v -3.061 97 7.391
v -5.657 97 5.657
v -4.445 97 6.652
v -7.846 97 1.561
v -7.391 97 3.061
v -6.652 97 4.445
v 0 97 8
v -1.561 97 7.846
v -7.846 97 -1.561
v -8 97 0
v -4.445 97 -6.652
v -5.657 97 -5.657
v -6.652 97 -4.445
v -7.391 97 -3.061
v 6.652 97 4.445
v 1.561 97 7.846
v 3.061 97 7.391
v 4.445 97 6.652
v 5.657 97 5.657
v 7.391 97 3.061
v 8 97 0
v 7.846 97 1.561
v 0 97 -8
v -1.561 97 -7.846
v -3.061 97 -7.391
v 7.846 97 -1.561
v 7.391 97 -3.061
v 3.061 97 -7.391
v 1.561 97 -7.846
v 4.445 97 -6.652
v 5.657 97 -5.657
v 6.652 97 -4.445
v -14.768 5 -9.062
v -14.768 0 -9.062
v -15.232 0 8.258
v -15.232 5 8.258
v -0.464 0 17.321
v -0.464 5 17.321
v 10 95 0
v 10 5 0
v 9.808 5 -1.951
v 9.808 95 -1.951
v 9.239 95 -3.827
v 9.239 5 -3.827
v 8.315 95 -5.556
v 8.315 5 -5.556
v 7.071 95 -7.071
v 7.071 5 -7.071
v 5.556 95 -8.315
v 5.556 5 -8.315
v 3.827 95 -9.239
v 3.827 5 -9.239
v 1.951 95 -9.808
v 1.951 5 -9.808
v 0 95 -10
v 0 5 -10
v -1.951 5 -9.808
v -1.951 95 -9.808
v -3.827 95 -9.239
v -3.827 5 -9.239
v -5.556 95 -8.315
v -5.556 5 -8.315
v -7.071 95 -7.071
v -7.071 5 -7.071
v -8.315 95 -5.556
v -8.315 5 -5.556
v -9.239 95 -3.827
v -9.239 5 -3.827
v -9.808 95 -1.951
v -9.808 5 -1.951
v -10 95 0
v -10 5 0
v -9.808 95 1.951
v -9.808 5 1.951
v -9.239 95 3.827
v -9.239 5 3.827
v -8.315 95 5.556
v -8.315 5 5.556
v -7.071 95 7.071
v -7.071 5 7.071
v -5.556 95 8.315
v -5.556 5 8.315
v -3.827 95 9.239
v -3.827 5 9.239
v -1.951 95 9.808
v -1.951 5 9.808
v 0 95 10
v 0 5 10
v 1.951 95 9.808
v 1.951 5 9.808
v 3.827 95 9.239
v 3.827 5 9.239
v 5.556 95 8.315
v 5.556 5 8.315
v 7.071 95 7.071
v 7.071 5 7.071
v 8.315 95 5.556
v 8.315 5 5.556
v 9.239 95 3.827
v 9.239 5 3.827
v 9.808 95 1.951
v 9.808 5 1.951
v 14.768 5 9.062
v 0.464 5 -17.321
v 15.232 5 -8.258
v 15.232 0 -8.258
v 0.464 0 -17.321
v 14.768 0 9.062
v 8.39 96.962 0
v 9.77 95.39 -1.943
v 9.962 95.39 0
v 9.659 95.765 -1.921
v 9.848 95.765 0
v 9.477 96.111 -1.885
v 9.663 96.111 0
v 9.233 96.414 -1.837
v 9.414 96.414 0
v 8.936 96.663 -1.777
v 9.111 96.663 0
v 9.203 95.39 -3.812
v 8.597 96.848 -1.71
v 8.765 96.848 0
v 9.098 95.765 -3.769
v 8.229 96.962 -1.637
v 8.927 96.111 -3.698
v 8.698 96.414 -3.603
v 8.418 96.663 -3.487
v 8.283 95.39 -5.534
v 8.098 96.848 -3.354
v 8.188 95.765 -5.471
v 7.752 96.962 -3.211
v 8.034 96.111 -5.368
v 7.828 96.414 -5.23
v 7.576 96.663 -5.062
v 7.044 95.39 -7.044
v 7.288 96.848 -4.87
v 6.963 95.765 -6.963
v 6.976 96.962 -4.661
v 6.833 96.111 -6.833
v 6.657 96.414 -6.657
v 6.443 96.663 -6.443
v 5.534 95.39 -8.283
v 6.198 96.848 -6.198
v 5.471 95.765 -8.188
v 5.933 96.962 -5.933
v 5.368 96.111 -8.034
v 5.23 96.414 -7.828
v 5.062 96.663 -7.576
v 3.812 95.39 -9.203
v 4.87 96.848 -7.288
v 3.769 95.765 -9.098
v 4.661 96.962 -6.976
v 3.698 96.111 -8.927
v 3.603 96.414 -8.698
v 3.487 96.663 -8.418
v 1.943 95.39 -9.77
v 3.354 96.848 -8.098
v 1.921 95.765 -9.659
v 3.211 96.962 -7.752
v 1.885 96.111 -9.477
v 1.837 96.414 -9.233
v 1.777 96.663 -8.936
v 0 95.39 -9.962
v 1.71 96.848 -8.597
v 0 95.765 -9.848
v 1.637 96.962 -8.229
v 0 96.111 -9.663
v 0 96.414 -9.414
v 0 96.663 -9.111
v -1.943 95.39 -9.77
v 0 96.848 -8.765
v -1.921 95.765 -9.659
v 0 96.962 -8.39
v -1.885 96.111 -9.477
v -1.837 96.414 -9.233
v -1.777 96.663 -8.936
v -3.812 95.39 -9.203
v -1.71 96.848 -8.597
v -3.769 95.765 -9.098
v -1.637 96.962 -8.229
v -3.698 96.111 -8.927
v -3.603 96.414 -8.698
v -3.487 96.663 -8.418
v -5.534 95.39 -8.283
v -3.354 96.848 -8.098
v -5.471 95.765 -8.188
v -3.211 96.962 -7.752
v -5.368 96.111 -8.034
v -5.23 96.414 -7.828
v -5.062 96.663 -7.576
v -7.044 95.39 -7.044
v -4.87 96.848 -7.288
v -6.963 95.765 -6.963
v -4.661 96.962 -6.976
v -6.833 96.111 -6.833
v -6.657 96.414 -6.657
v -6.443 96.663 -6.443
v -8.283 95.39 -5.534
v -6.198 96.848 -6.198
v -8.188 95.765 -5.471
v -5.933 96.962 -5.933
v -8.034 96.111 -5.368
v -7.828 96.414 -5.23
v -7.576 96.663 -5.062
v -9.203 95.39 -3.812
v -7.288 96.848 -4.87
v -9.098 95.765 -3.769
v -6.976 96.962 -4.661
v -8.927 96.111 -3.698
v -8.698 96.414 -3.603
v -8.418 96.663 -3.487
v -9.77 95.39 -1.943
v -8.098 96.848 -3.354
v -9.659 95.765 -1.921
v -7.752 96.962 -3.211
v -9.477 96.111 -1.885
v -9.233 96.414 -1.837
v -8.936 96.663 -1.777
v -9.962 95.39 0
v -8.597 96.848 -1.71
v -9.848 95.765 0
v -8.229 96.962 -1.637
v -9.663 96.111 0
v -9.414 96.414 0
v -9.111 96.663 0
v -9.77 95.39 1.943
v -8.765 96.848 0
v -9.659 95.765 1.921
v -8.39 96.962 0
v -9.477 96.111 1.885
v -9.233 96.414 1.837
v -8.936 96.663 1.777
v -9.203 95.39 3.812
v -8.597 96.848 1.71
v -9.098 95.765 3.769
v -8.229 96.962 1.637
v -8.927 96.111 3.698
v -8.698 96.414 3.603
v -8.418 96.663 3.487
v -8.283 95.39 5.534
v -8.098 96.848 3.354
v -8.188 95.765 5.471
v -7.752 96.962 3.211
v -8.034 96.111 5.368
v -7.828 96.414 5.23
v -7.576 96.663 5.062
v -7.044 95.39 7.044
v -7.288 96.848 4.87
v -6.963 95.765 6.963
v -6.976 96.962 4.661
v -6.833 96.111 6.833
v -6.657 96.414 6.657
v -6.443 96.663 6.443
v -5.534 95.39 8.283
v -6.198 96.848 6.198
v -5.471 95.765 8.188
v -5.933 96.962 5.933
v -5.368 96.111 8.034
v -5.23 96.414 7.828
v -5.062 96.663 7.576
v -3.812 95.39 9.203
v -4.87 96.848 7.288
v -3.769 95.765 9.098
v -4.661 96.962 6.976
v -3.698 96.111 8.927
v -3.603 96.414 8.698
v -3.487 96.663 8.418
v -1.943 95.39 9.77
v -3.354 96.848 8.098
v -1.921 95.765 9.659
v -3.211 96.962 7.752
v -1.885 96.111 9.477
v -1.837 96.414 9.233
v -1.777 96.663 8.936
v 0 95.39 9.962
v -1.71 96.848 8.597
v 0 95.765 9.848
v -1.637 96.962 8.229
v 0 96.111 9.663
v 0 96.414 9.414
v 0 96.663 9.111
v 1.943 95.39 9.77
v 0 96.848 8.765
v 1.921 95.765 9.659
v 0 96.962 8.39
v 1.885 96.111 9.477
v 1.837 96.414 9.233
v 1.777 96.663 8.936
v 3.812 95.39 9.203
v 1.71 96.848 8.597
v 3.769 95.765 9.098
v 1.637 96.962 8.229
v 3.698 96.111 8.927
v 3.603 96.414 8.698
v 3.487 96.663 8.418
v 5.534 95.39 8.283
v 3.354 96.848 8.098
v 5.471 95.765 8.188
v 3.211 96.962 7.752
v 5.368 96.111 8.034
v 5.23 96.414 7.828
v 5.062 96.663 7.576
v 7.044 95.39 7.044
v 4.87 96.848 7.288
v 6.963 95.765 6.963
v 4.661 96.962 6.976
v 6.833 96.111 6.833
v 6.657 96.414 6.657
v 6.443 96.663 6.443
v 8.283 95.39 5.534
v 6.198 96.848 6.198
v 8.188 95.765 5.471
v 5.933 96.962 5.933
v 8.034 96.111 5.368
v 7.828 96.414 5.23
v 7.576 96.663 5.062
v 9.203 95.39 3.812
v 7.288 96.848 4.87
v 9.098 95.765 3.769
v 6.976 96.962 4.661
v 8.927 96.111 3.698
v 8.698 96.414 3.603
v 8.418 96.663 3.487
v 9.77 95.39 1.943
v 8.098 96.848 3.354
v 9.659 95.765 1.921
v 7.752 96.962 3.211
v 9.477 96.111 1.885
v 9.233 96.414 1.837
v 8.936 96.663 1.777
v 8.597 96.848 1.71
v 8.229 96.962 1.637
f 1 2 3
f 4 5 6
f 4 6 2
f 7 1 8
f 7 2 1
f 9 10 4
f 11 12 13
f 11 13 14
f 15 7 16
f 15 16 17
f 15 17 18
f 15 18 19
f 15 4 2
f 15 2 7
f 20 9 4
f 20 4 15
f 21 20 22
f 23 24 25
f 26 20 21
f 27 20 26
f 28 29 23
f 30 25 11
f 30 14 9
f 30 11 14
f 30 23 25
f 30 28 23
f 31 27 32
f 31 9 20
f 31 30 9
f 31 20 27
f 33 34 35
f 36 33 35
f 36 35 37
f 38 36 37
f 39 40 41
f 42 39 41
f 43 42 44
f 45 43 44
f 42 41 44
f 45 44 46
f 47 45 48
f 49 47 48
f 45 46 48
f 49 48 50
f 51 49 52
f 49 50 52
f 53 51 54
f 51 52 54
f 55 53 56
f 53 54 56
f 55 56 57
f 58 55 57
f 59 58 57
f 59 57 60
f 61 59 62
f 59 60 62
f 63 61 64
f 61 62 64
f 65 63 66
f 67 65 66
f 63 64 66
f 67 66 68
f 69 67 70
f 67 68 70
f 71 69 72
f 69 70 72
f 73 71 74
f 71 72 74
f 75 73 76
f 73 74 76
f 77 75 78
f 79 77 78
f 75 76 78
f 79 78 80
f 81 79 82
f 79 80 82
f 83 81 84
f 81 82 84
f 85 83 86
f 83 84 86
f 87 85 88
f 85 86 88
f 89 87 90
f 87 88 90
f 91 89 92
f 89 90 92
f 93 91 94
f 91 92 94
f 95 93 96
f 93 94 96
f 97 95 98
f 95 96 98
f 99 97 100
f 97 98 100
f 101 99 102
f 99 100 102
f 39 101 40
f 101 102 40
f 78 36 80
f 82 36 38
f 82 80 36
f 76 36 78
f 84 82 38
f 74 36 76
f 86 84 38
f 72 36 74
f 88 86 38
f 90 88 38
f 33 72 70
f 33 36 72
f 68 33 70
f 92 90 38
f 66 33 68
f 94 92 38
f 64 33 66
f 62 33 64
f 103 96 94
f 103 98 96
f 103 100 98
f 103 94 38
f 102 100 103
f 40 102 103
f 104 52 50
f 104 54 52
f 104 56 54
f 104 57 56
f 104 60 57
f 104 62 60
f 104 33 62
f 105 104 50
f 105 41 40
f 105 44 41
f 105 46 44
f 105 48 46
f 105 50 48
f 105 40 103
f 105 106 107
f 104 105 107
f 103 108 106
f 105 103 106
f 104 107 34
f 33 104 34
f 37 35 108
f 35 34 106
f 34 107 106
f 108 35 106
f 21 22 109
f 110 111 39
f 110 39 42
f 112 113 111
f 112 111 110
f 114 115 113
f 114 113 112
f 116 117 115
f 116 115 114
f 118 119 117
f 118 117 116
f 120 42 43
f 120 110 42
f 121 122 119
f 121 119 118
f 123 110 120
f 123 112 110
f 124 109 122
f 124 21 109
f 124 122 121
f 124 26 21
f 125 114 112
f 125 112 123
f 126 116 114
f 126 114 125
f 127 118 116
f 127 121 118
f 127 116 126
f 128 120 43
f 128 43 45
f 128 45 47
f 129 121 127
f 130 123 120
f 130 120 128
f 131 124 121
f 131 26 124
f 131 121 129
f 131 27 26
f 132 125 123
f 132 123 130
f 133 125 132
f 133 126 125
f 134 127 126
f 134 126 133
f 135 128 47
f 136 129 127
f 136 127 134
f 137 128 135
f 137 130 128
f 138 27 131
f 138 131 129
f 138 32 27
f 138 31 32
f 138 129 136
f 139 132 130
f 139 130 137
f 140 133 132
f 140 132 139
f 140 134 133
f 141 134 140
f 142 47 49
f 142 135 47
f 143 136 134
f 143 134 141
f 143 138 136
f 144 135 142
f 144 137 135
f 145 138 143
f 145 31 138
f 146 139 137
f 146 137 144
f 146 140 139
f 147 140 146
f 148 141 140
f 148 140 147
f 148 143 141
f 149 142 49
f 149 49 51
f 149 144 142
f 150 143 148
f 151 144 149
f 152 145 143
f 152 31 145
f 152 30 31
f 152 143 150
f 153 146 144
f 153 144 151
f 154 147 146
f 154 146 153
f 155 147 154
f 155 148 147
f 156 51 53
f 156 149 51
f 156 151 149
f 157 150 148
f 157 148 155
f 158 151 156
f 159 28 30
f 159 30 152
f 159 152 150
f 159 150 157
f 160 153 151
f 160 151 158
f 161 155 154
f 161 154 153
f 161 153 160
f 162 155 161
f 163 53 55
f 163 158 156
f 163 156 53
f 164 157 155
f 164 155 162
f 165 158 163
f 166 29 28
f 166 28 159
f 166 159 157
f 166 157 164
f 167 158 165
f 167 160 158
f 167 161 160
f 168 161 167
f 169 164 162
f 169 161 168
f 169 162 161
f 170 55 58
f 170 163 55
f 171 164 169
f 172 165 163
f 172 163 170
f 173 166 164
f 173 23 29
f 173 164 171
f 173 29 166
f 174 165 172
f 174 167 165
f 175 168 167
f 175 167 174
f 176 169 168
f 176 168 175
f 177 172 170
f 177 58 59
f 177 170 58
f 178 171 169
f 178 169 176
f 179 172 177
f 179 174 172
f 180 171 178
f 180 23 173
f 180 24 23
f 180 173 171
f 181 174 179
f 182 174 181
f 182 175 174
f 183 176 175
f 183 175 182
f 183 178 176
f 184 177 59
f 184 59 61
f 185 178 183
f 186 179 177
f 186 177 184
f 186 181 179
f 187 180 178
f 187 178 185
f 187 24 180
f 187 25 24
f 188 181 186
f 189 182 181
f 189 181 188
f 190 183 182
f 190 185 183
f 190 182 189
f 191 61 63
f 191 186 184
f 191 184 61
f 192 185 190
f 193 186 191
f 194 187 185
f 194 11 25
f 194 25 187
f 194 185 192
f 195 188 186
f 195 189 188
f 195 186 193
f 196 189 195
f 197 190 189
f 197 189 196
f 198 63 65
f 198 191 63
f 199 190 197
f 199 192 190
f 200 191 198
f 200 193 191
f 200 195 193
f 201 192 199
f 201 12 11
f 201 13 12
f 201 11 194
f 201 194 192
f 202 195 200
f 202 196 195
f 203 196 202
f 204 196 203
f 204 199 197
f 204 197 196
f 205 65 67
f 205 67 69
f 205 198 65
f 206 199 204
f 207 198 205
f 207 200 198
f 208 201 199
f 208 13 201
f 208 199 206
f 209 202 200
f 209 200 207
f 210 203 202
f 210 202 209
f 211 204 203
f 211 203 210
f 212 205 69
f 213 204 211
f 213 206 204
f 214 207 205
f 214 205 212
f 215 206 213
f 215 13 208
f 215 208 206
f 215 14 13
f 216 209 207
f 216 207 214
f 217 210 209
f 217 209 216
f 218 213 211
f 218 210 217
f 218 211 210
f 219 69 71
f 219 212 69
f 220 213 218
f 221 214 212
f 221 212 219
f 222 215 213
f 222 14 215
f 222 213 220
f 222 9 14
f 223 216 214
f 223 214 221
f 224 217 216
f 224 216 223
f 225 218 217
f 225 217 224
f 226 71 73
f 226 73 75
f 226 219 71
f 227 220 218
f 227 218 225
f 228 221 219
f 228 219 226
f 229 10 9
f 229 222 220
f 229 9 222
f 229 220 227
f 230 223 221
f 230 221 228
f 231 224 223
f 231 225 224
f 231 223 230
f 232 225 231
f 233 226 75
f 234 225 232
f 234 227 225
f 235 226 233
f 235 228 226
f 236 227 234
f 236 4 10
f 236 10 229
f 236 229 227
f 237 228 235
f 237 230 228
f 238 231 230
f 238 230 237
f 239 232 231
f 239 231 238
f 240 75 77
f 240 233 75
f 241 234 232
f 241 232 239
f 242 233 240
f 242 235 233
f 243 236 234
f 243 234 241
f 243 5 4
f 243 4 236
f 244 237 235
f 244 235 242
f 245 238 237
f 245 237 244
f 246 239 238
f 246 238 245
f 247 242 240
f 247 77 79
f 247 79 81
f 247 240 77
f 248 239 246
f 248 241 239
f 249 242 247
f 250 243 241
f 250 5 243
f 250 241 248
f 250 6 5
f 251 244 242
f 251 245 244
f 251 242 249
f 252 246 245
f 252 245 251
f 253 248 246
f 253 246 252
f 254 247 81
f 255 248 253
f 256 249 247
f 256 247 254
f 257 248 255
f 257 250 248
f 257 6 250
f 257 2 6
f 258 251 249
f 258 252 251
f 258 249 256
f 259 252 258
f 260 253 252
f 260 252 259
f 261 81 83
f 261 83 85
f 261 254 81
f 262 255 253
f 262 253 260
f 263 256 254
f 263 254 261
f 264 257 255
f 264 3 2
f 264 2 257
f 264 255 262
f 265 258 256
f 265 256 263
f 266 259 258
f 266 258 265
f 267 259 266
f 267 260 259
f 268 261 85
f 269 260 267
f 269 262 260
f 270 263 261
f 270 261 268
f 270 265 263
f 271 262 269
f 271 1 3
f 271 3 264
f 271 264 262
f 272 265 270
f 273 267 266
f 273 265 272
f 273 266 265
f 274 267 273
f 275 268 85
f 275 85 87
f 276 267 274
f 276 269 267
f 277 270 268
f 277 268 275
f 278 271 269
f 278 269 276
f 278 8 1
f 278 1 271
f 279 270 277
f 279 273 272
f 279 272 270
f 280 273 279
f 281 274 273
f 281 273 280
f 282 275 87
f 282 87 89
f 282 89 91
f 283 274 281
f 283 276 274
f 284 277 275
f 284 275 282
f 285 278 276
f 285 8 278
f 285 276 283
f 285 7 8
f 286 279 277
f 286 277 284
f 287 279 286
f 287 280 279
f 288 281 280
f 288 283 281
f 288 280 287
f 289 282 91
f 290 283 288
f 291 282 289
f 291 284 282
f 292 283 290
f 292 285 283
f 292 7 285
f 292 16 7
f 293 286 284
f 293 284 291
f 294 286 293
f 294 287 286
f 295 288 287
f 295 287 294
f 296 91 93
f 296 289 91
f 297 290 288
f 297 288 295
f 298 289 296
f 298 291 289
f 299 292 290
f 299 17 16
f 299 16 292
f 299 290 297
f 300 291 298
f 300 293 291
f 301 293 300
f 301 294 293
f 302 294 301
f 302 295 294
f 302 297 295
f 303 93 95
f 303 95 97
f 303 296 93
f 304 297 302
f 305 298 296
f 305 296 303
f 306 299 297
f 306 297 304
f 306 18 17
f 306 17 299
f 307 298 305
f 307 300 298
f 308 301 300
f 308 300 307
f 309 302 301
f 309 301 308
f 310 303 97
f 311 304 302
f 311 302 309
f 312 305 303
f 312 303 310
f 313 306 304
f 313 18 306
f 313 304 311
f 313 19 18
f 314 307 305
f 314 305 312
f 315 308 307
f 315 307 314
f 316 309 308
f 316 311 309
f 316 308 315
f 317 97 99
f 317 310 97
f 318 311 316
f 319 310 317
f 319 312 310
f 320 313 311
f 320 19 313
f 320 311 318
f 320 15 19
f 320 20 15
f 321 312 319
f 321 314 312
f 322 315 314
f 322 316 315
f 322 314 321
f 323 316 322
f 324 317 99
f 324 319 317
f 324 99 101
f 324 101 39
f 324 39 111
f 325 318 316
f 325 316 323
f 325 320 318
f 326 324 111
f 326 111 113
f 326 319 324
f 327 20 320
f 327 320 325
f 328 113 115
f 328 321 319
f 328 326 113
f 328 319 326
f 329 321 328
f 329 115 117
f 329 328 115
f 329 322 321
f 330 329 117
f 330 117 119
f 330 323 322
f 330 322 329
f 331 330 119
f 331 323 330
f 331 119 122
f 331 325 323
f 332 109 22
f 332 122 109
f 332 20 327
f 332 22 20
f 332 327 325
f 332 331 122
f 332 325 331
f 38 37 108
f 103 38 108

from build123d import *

# Parameters (mm, degrees)
BOSS_EXTRU_1_DEPTH = 5
ESQUISSE2_R        = 10
BOSS_EXTRU_2_DEPTH = 92
CONG_1_R           = 2


with BuildPart() as part:
    # Esquisse1 → Boss.-Extru.1 (new body)
    with BuildSketch(Plane(origin=(0, 0, 0), x_dir=(1, 0, 0), z_dir=(0, 1, 0))):
        Polygon((-14.767960782, 9.062157753), (-15.232039218, -8.258350323), (-0.464078436, -17.320508076), (14.767960782, -9.062157753), (15.232039218, 8.258350323), (0.464078436, 17.320508076), align=None)
    extrude(amount=BOSS_EXTRU_1_DEPTH)

    # Esquisse2 → Boss.-Extru.2 (add)
    with BuildSketch(Plane(origin=(0, 5, 0), x_dir=(1, 0, 0), z_dir=(0, 1, 0))):
        Circle(ESQUISSE2_R)
    extrude(amount=BOSS_EXTRU_2_DEPTH)

    # Congé1
    cong_1_edges = [part.edges().sort_by_distance(p)[0] for p in [
        (-10, 97, 0),
    ]]
    fillet(cong_1_edges, radius=CONG_1_R)


solid = part.part
